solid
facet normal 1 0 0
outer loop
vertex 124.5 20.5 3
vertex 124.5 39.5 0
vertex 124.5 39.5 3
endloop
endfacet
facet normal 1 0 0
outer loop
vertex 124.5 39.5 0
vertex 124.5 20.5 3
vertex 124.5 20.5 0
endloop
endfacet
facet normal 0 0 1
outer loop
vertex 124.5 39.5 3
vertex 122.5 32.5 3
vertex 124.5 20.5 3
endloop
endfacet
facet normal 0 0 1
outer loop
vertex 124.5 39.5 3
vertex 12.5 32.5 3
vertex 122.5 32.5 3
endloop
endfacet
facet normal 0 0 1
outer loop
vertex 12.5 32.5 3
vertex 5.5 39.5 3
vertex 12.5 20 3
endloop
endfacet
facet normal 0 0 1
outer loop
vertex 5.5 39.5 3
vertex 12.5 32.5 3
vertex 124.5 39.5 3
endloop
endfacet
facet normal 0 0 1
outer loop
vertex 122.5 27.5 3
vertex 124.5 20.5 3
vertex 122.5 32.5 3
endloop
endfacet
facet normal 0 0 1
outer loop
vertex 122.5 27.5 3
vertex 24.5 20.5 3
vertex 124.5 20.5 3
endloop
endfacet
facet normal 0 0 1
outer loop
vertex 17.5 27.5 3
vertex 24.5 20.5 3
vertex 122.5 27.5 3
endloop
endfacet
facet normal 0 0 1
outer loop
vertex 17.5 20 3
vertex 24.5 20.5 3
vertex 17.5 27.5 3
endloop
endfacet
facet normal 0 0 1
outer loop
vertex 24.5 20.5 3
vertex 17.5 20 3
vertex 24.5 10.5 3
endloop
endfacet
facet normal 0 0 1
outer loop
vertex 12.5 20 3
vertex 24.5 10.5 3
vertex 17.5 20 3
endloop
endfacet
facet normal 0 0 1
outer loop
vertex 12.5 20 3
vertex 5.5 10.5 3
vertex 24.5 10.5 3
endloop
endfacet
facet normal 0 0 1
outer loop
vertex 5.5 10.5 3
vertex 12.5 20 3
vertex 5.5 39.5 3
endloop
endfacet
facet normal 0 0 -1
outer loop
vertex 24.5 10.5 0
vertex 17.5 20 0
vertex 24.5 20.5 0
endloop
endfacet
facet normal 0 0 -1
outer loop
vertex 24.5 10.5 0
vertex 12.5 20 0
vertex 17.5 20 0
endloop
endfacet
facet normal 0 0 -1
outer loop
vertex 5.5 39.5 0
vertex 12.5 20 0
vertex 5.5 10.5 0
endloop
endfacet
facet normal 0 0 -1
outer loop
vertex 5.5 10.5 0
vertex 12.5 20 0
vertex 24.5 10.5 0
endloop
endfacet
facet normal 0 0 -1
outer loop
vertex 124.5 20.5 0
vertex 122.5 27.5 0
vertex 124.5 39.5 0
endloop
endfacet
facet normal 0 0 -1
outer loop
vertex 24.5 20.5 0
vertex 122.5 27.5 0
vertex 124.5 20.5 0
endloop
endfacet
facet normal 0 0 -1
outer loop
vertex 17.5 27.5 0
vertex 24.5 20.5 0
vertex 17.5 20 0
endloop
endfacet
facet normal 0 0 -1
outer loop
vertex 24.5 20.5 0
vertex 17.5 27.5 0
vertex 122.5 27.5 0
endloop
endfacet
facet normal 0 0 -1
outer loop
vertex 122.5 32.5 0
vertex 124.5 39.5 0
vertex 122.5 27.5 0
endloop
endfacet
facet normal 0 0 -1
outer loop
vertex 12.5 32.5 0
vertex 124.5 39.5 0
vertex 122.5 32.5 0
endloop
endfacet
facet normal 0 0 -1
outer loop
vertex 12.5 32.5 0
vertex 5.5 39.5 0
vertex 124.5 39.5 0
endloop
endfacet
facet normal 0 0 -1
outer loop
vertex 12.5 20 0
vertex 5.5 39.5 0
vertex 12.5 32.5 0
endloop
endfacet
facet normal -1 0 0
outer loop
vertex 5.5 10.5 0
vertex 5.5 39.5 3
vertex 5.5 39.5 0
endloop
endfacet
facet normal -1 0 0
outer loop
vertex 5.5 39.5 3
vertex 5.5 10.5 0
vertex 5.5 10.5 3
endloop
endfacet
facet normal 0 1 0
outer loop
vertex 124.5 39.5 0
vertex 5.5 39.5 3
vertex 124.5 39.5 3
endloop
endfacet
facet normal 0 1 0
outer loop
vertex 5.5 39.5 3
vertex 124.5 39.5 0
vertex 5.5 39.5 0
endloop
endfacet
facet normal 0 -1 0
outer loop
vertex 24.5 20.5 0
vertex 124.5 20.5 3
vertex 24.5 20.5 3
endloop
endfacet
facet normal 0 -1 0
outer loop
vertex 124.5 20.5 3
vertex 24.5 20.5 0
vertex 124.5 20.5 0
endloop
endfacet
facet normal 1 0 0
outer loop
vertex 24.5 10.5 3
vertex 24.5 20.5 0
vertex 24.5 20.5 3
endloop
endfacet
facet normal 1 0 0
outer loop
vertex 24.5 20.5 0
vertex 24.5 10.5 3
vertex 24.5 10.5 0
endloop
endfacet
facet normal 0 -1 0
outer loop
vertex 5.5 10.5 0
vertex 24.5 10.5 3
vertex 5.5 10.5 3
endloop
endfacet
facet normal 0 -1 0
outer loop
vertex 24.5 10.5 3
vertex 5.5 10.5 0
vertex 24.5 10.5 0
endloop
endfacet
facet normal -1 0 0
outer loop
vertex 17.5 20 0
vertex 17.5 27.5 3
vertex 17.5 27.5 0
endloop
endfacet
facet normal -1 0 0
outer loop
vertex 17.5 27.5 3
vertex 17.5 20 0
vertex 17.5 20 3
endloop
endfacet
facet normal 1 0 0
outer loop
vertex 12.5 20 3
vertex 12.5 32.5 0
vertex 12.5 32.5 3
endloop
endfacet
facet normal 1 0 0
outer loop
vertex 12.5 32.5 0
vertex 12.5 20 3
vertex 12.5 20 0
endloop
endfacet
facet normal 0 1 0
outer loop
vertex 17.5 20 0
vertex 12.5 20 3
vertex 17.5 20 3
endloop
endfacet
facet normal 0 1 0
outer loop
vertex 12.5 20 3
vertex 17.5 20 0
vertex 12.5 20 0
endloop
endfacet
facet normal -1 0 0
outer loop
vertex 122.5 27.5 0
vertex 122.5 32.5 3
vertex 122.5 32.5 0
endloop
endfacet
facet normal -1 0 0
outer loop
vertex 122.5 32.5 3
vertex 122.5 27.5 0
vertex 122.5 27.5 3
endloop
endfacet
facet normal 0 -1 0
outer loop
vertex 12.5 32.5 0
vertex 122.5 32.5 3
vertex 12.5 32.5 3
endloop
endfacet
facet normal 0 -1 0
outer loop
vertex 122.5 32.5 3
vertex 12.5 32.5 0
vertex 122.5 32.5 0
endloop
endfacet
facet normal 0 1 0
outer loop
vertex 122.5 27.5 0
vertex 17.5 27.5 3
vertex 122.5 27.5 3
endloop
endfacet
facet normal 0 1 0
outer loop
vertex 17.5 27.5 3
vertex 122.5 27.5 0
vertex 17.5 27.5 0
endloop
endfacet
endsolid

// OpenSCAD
difference(){
union(){
translate([5.5,20.5,0])cube([119,19,3]);
translate([5.5,10.5,0])cube([19,19,3]);
}
translate([12.5,20,-1])cube([5,10,8]);
translate([12.5,27.5,-1])cube([110,5,8]);
}
